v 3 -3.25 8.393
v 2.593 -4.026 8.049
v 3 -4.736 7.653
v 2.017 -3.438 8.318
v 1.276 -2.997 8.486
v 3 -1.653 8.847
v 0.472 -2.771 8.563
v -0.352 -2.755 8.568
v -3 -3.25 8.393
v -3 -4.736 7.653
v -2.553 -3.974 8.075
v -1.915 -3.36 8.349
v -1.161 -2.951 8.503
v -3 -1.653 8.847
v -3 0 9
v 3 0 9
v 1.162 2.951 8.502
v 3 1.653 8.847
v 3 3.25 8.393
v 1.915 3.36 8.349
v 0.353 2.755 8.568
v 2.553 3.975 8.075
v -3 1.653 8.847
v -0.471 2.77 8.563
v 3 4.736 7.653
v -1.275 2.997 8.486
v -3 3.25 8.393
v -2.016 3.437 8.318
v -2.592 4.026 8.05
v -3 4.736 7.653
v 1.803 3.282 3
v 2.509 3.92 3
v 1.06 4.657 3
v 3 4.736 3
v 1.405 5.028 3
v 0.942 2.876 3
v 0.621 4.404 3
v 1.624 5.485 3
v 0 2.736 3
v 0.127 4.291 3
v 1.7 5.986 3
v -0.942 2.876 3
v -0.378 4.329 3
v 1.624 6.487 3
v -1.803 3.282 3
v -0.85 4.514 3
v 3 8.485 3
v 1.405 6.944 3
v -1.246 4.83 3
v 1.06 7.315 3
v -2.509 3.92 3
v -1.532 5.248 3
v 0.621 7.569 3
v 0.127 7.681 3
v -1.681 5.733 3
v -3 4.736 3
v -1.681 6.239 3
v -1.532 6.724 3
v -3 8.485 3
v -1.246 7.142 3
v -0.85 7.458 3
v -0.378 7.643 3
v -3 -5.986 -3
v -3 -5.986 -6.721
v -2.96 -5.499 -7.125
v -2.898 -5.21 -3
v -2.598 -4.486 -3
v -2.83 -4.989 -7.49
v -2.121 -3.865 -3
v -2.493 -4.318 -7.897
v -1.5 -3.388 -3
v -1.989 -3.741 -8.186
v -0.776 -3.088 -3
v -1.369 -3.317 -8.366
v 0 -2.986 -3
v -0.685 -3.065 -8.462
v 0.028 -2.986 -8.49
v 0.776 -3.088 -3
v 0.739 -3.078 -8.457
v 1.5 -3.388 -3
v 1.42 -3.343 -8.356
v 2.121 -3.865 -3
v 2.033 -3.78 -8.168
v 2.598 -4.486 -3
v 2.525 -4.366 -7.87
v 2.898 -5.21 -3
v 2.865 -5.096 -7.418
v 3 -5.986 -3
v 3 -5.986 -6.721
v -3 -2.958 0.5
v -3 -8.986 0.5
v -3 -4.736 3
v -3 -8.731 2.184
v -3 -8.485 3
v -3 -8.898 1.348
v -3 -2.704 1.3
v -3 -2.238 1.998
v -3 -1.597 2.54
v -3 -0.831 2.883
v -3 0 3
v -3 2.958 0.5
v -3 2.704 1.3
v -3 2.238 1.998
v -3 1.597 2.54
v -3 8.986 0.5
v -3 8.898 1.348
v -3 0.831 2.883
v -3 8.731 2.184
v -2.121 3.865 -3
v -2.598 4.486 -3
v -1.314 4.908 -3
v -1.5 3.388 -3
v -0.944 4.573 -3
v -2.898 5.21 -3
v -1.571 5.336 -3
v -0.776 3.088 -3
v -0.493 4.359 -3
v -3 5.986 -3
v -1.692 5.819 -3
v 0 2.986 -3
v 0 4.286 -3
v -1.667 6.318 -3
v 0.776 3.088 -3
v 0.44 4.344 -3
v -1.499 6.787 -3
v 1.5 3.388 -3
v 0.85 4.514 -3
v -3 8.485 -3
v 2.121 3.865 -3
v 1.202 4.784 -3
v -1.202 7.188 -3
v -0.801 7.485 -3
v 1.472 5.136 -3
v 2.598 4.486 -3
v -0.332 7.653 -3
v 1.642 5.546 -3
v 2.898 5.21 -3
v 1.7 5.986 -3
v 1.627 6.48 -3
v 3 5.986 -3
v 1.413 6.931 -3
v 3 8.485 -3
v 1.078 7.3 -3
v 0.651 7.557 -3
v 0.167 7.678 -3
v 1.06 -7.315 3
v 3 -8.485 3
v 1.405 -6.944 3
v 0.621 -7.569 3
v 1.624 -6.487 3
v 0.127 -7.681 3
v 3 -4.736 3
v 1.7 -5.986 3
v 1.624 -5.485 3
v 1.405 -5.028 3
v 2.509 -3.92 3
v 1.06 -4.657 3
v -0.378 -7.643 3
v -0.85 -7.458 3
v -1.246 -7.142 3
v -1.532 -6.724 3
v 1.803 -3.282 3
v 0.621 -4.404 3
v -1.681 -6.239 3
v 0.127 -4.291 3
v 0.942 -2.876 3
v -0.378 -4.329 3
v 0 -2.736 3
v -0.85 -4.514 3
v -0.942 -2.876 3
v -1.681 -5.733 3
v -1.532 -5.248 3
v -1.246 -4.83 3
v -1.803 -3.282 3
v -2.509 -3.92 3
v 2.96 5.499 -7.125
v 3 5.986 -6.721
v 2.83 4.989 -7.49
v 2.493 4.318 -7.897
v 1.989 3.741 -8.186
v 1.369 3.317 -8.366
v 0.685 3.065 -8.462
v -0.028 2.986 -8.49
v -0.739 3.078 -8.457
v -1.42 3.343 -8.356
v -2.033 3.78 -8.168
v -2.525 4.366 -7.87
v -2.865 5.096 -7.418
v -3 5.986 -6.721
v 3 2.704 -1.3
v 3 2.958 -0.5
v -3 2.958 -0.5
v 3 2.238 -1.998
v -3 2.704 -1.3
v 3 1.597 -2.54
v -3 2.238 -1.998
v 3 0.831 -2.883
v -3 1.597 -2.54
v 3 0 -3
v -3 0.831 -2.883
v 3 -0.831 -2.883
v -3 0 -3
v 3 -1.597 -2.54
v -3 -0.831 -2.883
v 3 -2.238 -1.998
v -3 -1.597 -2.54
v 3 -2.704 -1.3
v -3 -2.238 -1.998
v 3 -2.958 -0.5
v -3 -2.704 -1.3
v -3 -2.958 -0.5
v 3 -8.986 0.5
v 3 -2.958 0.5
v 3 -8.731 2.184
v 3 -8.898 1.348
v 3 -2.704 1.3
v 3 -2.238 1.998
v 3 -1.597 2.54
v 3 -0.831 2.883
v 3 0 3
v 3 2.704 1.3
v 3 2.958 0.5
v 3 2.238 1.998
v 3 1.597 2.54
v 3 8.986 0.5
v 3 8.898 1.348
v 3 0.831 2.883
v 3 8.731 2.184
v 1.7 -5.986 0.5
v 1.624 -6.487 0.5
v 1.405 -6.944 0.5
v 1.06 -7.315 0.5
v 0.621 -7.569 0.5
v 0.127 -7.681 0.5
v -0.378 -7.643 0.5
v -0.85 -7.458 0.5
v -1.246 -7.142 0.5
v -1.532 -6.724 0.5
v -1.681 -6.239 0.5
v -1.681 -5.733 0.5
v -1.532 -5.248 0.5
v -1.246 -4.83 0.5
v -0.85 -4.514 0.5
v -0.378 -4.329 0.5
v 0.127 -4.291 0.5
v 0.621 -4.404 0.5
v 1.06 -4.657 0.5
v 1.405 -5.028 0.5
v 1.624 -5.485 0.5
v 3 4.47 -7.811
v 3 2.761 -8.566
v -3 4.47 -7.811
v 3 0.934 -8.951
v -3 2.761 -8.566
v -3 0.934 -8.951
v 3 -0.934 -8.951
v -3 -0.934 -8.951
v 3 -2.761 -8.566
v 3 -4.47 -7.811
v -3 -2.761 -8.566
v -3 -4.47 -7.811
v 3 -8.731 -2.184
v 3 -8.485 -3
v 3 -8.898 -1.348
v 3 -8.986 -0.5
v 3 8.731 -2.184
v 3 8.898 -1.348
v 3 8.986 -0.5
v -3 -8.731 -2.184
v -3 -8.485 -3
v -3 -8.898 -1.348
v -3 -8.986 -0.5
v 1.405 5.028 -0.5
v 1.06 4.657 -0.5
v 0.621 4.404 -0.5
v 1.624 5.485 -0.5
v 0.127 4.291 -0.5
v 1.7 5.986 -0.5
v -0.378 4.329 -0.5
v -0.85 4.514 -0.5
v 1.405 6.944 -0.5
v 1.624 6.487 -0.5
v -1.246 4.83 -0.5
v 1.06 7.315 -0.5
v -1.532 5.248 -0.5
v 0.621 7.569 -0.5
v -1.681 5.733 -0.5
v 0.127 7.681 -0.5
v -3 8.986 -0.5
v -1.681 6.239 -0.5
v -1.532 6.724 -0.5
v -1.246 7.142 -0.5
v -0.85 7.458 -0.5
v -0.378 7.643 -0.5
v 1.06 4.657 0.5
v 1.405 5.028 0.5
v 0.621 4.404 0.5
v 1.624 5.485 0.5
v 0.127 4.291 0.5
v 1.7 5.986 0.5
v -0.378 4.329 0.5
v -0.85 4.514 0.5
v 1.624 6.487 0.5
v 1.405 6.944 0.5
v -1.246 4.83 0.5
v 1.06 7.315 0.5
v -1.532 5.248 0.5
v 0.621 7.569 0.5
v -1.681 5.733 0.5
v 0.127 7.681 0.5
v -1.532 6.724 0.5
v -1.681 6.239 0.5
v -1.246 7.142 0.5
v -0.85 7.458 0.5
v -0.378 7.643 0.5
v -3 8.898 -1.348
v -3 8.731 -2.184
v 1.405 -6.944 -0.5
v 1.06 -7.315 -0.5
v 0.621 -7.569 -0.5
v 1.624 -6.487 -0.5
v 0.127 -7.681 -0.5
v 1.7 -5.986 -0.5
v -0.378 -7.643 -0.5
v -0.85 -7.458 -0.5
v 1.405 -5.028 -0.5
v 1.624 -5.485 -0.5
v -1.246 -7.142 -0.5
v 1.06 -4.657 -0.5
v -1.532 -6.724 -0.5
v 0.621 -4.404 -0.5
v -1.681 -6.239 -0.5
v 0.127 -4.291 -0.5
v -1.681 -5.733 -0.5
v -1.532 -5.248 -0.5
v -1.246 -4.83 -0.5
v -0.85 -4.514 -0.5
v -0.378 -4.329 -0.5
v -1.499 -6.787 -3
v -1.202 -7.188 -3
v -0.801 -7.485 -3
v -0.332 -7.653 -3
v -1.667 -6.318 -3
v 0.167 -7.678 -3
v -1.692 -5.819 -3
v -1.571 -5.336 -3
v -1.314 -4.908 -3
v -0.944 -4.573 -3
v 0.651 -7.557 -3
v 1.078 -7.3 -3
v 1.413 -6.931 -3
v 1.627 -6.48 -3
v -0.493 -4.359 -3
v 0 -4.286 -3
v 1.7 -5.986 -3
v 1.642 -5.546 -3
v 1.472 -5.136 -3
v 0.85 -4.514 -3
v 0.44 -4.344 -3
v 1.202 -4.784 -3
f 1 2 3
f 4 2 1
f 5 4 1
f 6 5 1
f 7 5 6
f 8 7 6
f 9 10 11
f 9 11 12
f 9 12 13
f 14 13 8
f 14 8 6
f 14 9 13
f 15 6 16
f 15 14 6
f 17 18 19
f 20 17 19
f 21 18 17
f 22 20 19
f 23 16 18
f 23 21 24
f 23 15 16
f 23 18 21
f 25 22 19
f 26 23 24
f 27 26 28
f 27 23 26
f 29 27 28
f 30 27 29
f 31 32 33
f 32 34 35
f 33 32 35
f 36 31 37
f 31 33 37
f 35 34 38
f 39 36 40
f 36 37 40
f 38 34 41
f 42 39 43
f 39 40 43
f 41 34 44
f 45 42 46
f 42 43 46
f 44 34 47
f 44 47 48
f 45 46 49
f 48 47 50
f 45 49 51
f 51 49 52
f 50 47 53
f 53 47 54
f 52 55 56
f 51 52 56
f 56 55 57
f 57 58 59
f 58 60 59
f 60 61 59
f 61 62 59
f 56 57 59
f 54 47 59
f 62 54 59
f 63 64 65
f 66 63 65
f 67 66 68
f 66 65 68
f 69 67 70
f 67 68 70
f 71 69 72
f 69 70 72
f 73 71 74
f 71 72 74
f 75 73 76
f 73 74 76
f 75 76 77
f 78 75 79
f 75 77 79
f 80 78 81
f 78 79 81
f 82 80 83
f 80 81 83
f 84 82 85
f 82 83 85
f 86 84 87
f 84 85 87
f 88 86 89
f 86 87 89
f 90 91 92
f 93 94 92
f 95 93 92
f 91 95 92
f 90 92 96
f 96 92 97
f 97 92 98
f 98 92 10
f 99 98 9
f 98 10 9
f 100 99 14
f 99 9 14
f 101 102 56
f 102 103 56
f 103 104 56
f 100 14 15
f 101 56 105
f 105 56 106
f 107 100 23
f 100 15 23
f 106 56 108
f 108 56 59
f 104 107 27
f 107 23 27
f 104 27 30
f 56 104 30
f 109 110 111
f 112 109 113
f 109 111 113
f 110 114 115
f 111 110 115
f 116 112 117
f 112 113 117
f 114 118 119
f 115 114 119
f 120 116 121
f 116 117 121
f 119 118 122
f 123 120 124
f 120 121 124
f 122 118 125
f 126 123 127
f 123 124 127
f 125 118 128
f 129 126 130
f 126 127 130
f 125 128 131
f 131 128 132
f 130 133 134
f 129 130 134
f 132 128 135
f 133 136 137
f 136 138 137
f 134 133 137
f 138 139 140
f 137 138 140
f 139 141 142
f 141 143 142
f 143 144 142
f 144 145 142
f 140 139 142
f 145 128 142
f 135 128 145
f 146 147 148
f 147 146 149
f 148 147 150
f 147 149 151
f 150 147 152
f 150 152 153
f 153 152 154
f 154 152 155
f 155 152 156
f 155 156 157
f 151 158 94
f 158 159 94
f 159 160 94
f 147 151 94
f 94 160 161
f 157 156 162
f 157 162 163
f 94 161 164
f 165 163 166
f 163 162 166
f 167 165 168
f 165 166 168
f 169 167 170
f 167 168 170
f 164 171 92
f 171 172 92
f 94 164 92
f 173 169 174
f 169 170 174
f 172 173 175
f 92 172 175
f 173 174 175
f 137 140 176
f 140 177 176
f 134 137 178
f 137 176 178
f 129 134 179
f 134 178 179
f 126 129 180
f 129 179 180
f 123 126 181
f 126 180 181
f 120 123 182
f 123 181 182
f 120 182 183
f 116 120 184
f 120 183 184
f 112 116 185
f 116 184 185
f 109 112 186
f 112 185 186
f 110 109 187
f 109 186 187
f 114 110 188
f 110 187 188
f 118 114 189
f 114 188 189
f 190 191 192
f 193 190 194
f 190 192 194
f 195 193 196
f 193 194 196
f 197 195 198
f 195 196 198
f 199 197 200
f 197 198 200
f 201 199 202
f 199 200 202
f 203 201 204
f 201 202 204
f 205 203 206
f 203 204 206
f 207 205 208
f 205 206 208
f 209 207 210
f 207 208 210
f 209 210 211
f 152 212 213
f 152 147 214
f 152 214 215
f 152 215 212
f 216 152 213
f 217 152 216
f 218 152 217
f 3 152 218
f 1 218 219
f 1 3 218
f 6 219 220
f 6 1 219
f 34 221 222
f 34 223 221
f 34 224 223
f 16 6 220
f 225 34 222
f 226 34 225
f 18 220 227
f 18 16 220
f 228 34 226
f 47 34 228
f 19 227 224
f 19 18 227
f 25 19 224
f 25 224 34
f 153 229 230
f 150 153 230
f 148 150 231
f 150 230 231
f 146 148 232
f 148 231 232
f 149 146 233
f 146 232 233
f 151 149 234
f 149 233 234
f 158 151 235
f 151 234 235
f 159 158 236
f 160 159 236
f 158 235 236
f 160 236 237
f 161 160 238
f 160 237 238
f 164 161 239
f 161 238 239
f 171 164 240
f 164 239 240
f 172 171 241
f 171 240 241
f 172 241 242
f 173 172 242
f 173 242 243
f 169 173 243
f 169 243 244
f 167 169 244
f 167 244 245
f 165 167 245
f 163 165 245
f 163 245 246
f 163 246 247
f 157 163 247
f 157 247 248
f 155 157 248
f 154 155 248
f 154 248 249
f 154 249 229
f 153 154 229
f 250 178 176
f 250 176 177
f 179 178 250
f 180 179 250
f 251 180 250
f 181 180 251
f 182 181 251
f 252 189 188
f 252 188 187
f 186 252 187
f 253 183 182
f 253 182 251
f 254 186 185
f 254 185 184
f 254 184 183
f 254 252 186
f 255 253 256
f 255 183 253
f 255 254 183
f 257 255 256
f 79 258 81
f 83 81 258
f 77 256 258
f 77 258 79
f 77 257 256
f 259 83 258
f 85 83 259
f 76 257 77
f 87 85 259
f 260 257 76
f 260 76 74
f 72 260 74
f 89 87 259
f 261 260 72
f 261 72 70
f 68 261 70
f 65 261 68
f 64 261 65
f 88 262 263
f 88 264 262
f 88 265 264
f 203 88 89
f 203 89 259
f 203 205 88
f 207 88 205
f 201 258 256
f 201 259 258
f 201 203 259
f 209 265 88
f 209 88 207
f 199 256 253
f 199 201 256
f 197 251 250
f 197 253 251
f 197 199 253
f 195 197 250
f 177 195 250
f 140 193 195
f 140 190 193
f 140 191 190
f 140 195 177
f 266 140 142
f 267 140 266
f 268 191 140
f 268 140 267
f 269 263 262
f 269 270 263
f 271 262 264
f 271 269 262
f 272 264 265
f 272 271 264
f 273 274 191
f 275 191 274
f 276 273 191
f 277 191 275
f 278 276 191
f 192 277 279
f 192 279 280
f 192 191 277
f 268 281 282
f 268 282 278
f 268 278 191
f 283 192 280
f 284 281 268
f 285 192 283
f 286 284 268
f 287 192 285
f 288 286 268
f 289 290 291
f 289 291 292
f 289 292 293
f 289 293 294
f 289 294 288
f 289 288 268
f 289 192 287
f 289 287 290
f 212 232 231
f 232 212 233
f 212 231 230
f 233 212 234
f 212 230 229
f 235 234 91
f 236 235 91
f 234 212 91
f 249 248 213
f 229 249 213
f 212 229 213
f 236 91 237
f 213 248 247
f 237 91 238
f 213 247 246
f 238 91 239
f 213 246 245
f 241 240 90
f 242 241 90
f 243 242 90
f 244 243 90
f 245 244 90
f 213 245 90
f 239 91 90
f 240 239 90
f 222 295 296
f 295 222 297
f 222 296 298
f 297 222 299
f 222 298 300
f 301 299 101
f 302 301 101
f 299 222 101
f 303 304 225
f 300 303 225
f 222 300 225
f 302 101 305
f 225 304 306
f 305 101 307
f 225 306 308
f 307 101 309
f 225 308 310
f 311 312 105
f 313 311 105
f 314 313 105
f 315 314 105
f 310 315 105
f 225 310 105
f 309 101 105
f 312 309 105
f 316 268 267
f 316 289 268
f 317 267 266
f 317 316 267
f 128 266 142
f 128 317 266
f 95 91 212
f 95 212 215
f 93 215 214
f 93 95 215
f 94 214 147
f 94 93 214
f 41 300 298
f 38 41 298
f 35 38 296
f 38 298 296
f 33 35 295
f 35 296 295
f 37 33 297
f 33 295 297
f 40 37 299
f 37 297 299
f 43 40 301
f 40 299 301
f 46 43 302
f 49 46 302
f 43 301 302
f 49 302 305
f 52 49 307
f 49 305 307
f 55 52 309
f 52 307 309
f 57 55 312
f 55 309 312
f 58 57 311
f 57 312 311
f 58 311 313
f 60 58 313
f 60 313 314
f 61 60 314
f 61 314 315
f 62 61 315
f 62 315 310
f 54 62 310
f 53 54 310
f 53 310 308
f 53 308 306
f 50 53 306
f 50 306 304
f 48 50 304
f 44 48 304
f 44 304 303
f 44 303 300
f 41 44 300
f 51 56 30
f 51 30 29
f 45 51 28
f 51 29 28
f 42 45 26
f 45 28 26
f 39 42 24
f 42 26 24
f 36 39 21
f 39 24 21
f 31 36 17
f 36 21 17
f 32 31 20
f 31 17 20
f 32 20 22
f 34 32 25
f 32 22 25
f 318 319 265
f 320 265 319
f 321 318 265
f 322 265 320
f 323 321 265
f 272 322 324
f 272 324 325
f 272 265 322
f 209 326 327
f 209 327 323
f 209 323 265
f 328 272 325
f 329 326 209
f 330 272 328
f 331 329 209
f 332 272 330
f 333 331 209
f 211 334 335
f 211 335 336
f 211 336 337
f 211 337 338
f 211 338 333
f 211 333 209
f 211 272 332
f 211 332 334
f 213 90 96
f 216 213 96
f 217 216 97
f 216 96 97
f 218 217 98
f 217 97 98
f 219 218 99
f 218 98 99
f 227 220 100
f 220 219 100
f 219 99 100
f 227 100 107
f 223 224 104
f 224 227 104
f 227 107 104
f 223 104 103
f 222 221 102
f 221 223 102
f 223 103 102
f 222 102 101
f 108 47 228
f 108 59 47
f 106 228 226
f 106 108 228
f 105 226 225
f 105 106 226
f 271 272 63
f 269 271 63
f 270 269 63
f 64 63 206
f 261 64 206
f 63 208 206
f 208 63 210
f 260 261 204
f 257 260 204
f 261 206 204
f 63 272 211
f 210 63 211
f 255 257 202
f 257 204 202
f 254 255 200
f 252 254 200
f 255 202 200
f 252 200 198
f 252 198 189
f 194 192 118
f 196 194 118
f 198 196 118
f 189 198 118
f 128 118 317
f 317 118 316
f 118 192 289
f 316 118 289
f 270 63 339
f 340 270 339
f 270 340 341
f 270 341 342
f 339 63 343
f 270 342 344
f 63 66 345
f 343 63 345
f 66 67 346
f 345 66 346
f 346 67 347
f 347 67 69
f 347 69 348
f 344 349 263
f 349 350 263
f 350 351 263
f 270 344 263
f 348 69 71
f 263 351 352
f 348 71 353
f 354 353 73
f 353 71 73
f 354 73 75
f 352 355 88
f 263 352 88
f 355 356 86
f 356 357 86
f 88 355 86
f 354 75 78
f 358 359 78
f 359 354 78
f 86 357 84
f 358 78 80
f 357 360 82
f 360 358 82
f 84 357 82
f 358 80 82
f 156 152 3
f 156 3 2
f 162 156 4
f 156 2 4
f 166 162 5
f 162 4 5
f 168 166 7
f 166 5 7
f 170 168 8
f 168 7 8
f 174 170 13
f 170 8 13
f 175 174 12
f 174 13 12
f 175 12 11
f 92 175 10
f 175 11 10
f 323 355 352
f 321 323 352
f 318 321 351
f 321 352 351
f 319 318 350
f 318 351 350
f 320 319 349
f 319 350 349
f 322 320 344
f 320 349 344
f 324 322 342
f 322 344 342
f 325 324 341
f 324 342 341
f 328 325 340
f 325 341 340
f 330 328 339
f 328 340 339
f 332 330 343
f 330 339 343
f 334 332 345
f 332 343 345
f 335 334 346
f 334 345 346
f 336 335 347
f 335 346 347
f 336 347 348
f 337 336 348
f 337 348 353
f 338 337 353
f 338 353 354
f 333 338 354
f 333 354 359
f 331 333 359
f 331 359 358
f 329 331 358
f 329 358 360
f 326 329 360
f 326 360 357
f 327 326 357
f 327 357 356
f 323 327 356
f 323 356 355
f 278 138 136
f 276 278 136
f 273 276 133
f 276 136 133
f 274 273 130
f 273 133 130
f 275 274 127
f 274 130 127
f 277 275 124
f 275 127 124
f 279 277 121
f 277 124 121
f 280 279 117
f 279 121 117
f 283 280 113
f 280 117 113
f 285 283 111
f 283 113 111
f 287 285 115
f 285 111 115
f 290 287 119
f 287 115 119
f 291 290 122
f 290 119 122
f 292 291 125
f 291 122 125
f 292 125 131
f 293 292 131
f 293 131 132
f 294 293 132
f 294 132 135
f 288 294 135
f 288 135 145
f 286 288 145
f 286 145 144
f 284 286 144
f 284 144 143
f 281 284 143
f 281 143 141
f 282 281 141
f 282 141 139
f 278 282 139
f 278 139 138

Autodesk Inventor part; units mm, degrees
ref_plane "YZ Plane" through (0, 0, 0) normal (1, 0, 0) x (0, 1, 0)
sketch "スケッチ1" plane through (0, 0, 0) normal (1, 0, 0) x (0, 1, 0)
  circle A0 centre (0, 0) radius 3
  circle A1 centre (0, 0) radius 9
  line L0 (-8.9861, 0.5) -> (8.9861, 0.5)
  line L1 (0, 0) -> (9, 0)
  line L2 (-8.9861, -0.5) -> (8.9861, -0.5)
  line L3 (0, 0) -> (0, -9)
  line L4 (8.4853, -3) -> (-8.4853, -3)
  point P0 (-2.958, 0.5)
  point P1 (2.958, 0.5)
  point P2 (-2.958, -0.5)
  point P3 (2.958, -0.5)
  dimension "d0" = 6
  dimension "d1" = 18
  dimension "d2" = 0.5
  dimension "d9" = 2.5
extrude "押し出し1" add sketch "スケッチ1" along normal mid plane 6 contours A0 L0 A1 | L2 A1 L4 A0 | L4 A1 L2 A0 | L4 A1 L3 | L3 A1 L4
ref_plane "作業平面1" through (0, 0, -9) normal (0, 0, 1) x (1, 0, 0)
sketch "スケッチ2" plane through (0, 0, -9) normal (0, 0, 1) x (1, 0, 0)
  line L0 (-3, 8.9861) -> (3, 8.9861) projected
  line L1 (0, 0) -> (-3, 0)
  line L2 (-3, 8.9861) -> (-3, -8.9861) projected
  circle A0 centre (0, 5.9861) radius 1.7
  circle A1 centre (0, -5.9861) radius 1.7
  circle A2 centre (0, 5.9861) radius 3
  circle A3 centre (0, -5.9861) radius 3
  line L3 (3, -2.958) -> (3, -8.9861) projected
  line L4 (3, -5.9861) -> (3, -8.9861)
  line L5 (3, -8.9861) -> (0, -8.9861)
  line L6 (-3, -8.9861) -> (3, -8.9861) projected
  line L7 (0, -5.9861) -> (0, 5.9861)
  line L8 (-3, -2.958) -> (-3, -8.9861)
  line L9 (-3, -8.9861) -> (0, -8.9861)
  line L10 (-3, -8.9861) -> (-3, 8.9861)
  line L11 (3, 2.958) -> (3, 8.9861)
  line L12 (3, 8.9861) -> (0, 8.9861)
  line L13 (-3, 8.9861) -> (3, 8.9861)
  point P0 (-3, -5.9861)
  point P1 (3, 5.9861)
  point P2 (0, 8.9861)
  point P3 (-3, 5.9861)
  dimension "d11" = 6
  dimension "d5" = 3
  dimension "d6" = 3.4
  dimension "d10" = 6
extrude "押し出し2" cut sketch "スケッチ2" along normal through all contours A0 | A1
extrude "押し出し3" cut sketch "スケッチ2" along normal blind 6 contours L0 A2 L2 | L0 L11 A2 | A2 | A3 | A3 L6 L2 | L3 L5 A3
ref_plane "作業平面2" through (0, 0, 9) normal (0, 0, -1) x (-1, 0, 0)
sketch "スケッチ3" plane through (0, 0, 9) normal (0, 0, -1) x (-1, 0, 0)
  line L0 (-3, 8.9861) -> (3, 8.9861)
  line L1 (0, 0) -> (-3, 0)
  line L2 (-3, 8.9861) -> (-3, -8.9861)
  circle A0 centre (0, 5.9861) radius 1.7
  circle A1 centre (0, -5.9861) radius 1.7
  circle A2 centre (0, 5.9861) radius 2.5
  circle A3 centre (0, -5.9861) radius 2.5
  circle A4 centre (0, 5.9861) radius 3.25
  circle A5 centre (0, -5.9861) radius 3.25
  line L3 (3, -8.9861) -> (-3, -8.9861) projected
  line L4 (3, -4.7361) -> (3, -8.9861)
  line L5 (3, -8.9861) -> (-3, -8.9861)
  line L6 (-3, -8.9861) -> (-3, -4.7361)
  line L7 (-3, -8.9861) -> (-3, 8.9861)
  line L8 (3, 8.9861) -> (-3, 8.9861)
  line L9 (3, 4.7361) -> (3, 8.9861)
  point P0 (0, 0)
  point P1 (3, 7.2361)
  point P2 (1.25, 8.9861)
  point P3 (-3, 7.2361)
  point P4 (-1.25, 8.9861)
  point P5 (-1.25, -8.9861)
  point P6 (-3, -7.2361)
  point P7 (3, -7.2361)
  point P8 (1.25, -8.9861)
  dimension "d14" = 3
  dimension "d15" = 3.4
  dimension "d16" = 5
  dimension "d17" = 5
  dimension "d18" = 6.5
extrude "押し出し4" cut sketch "スケッチ3" along normal blind 6 contours A5 L4 L3 L2 | L2 A5 | L0 A4 L2 | A4 L0 | L0 A4 L9 L2 | L2 A4 | L0 L9 A4 | A4 L9 | A5 L3 L2 | A5 L4 | L3 A5 | L4 L3 A5 | A2 | A3
properties part number "setcolor-6-18-3d" material "ABS プラスチック"
